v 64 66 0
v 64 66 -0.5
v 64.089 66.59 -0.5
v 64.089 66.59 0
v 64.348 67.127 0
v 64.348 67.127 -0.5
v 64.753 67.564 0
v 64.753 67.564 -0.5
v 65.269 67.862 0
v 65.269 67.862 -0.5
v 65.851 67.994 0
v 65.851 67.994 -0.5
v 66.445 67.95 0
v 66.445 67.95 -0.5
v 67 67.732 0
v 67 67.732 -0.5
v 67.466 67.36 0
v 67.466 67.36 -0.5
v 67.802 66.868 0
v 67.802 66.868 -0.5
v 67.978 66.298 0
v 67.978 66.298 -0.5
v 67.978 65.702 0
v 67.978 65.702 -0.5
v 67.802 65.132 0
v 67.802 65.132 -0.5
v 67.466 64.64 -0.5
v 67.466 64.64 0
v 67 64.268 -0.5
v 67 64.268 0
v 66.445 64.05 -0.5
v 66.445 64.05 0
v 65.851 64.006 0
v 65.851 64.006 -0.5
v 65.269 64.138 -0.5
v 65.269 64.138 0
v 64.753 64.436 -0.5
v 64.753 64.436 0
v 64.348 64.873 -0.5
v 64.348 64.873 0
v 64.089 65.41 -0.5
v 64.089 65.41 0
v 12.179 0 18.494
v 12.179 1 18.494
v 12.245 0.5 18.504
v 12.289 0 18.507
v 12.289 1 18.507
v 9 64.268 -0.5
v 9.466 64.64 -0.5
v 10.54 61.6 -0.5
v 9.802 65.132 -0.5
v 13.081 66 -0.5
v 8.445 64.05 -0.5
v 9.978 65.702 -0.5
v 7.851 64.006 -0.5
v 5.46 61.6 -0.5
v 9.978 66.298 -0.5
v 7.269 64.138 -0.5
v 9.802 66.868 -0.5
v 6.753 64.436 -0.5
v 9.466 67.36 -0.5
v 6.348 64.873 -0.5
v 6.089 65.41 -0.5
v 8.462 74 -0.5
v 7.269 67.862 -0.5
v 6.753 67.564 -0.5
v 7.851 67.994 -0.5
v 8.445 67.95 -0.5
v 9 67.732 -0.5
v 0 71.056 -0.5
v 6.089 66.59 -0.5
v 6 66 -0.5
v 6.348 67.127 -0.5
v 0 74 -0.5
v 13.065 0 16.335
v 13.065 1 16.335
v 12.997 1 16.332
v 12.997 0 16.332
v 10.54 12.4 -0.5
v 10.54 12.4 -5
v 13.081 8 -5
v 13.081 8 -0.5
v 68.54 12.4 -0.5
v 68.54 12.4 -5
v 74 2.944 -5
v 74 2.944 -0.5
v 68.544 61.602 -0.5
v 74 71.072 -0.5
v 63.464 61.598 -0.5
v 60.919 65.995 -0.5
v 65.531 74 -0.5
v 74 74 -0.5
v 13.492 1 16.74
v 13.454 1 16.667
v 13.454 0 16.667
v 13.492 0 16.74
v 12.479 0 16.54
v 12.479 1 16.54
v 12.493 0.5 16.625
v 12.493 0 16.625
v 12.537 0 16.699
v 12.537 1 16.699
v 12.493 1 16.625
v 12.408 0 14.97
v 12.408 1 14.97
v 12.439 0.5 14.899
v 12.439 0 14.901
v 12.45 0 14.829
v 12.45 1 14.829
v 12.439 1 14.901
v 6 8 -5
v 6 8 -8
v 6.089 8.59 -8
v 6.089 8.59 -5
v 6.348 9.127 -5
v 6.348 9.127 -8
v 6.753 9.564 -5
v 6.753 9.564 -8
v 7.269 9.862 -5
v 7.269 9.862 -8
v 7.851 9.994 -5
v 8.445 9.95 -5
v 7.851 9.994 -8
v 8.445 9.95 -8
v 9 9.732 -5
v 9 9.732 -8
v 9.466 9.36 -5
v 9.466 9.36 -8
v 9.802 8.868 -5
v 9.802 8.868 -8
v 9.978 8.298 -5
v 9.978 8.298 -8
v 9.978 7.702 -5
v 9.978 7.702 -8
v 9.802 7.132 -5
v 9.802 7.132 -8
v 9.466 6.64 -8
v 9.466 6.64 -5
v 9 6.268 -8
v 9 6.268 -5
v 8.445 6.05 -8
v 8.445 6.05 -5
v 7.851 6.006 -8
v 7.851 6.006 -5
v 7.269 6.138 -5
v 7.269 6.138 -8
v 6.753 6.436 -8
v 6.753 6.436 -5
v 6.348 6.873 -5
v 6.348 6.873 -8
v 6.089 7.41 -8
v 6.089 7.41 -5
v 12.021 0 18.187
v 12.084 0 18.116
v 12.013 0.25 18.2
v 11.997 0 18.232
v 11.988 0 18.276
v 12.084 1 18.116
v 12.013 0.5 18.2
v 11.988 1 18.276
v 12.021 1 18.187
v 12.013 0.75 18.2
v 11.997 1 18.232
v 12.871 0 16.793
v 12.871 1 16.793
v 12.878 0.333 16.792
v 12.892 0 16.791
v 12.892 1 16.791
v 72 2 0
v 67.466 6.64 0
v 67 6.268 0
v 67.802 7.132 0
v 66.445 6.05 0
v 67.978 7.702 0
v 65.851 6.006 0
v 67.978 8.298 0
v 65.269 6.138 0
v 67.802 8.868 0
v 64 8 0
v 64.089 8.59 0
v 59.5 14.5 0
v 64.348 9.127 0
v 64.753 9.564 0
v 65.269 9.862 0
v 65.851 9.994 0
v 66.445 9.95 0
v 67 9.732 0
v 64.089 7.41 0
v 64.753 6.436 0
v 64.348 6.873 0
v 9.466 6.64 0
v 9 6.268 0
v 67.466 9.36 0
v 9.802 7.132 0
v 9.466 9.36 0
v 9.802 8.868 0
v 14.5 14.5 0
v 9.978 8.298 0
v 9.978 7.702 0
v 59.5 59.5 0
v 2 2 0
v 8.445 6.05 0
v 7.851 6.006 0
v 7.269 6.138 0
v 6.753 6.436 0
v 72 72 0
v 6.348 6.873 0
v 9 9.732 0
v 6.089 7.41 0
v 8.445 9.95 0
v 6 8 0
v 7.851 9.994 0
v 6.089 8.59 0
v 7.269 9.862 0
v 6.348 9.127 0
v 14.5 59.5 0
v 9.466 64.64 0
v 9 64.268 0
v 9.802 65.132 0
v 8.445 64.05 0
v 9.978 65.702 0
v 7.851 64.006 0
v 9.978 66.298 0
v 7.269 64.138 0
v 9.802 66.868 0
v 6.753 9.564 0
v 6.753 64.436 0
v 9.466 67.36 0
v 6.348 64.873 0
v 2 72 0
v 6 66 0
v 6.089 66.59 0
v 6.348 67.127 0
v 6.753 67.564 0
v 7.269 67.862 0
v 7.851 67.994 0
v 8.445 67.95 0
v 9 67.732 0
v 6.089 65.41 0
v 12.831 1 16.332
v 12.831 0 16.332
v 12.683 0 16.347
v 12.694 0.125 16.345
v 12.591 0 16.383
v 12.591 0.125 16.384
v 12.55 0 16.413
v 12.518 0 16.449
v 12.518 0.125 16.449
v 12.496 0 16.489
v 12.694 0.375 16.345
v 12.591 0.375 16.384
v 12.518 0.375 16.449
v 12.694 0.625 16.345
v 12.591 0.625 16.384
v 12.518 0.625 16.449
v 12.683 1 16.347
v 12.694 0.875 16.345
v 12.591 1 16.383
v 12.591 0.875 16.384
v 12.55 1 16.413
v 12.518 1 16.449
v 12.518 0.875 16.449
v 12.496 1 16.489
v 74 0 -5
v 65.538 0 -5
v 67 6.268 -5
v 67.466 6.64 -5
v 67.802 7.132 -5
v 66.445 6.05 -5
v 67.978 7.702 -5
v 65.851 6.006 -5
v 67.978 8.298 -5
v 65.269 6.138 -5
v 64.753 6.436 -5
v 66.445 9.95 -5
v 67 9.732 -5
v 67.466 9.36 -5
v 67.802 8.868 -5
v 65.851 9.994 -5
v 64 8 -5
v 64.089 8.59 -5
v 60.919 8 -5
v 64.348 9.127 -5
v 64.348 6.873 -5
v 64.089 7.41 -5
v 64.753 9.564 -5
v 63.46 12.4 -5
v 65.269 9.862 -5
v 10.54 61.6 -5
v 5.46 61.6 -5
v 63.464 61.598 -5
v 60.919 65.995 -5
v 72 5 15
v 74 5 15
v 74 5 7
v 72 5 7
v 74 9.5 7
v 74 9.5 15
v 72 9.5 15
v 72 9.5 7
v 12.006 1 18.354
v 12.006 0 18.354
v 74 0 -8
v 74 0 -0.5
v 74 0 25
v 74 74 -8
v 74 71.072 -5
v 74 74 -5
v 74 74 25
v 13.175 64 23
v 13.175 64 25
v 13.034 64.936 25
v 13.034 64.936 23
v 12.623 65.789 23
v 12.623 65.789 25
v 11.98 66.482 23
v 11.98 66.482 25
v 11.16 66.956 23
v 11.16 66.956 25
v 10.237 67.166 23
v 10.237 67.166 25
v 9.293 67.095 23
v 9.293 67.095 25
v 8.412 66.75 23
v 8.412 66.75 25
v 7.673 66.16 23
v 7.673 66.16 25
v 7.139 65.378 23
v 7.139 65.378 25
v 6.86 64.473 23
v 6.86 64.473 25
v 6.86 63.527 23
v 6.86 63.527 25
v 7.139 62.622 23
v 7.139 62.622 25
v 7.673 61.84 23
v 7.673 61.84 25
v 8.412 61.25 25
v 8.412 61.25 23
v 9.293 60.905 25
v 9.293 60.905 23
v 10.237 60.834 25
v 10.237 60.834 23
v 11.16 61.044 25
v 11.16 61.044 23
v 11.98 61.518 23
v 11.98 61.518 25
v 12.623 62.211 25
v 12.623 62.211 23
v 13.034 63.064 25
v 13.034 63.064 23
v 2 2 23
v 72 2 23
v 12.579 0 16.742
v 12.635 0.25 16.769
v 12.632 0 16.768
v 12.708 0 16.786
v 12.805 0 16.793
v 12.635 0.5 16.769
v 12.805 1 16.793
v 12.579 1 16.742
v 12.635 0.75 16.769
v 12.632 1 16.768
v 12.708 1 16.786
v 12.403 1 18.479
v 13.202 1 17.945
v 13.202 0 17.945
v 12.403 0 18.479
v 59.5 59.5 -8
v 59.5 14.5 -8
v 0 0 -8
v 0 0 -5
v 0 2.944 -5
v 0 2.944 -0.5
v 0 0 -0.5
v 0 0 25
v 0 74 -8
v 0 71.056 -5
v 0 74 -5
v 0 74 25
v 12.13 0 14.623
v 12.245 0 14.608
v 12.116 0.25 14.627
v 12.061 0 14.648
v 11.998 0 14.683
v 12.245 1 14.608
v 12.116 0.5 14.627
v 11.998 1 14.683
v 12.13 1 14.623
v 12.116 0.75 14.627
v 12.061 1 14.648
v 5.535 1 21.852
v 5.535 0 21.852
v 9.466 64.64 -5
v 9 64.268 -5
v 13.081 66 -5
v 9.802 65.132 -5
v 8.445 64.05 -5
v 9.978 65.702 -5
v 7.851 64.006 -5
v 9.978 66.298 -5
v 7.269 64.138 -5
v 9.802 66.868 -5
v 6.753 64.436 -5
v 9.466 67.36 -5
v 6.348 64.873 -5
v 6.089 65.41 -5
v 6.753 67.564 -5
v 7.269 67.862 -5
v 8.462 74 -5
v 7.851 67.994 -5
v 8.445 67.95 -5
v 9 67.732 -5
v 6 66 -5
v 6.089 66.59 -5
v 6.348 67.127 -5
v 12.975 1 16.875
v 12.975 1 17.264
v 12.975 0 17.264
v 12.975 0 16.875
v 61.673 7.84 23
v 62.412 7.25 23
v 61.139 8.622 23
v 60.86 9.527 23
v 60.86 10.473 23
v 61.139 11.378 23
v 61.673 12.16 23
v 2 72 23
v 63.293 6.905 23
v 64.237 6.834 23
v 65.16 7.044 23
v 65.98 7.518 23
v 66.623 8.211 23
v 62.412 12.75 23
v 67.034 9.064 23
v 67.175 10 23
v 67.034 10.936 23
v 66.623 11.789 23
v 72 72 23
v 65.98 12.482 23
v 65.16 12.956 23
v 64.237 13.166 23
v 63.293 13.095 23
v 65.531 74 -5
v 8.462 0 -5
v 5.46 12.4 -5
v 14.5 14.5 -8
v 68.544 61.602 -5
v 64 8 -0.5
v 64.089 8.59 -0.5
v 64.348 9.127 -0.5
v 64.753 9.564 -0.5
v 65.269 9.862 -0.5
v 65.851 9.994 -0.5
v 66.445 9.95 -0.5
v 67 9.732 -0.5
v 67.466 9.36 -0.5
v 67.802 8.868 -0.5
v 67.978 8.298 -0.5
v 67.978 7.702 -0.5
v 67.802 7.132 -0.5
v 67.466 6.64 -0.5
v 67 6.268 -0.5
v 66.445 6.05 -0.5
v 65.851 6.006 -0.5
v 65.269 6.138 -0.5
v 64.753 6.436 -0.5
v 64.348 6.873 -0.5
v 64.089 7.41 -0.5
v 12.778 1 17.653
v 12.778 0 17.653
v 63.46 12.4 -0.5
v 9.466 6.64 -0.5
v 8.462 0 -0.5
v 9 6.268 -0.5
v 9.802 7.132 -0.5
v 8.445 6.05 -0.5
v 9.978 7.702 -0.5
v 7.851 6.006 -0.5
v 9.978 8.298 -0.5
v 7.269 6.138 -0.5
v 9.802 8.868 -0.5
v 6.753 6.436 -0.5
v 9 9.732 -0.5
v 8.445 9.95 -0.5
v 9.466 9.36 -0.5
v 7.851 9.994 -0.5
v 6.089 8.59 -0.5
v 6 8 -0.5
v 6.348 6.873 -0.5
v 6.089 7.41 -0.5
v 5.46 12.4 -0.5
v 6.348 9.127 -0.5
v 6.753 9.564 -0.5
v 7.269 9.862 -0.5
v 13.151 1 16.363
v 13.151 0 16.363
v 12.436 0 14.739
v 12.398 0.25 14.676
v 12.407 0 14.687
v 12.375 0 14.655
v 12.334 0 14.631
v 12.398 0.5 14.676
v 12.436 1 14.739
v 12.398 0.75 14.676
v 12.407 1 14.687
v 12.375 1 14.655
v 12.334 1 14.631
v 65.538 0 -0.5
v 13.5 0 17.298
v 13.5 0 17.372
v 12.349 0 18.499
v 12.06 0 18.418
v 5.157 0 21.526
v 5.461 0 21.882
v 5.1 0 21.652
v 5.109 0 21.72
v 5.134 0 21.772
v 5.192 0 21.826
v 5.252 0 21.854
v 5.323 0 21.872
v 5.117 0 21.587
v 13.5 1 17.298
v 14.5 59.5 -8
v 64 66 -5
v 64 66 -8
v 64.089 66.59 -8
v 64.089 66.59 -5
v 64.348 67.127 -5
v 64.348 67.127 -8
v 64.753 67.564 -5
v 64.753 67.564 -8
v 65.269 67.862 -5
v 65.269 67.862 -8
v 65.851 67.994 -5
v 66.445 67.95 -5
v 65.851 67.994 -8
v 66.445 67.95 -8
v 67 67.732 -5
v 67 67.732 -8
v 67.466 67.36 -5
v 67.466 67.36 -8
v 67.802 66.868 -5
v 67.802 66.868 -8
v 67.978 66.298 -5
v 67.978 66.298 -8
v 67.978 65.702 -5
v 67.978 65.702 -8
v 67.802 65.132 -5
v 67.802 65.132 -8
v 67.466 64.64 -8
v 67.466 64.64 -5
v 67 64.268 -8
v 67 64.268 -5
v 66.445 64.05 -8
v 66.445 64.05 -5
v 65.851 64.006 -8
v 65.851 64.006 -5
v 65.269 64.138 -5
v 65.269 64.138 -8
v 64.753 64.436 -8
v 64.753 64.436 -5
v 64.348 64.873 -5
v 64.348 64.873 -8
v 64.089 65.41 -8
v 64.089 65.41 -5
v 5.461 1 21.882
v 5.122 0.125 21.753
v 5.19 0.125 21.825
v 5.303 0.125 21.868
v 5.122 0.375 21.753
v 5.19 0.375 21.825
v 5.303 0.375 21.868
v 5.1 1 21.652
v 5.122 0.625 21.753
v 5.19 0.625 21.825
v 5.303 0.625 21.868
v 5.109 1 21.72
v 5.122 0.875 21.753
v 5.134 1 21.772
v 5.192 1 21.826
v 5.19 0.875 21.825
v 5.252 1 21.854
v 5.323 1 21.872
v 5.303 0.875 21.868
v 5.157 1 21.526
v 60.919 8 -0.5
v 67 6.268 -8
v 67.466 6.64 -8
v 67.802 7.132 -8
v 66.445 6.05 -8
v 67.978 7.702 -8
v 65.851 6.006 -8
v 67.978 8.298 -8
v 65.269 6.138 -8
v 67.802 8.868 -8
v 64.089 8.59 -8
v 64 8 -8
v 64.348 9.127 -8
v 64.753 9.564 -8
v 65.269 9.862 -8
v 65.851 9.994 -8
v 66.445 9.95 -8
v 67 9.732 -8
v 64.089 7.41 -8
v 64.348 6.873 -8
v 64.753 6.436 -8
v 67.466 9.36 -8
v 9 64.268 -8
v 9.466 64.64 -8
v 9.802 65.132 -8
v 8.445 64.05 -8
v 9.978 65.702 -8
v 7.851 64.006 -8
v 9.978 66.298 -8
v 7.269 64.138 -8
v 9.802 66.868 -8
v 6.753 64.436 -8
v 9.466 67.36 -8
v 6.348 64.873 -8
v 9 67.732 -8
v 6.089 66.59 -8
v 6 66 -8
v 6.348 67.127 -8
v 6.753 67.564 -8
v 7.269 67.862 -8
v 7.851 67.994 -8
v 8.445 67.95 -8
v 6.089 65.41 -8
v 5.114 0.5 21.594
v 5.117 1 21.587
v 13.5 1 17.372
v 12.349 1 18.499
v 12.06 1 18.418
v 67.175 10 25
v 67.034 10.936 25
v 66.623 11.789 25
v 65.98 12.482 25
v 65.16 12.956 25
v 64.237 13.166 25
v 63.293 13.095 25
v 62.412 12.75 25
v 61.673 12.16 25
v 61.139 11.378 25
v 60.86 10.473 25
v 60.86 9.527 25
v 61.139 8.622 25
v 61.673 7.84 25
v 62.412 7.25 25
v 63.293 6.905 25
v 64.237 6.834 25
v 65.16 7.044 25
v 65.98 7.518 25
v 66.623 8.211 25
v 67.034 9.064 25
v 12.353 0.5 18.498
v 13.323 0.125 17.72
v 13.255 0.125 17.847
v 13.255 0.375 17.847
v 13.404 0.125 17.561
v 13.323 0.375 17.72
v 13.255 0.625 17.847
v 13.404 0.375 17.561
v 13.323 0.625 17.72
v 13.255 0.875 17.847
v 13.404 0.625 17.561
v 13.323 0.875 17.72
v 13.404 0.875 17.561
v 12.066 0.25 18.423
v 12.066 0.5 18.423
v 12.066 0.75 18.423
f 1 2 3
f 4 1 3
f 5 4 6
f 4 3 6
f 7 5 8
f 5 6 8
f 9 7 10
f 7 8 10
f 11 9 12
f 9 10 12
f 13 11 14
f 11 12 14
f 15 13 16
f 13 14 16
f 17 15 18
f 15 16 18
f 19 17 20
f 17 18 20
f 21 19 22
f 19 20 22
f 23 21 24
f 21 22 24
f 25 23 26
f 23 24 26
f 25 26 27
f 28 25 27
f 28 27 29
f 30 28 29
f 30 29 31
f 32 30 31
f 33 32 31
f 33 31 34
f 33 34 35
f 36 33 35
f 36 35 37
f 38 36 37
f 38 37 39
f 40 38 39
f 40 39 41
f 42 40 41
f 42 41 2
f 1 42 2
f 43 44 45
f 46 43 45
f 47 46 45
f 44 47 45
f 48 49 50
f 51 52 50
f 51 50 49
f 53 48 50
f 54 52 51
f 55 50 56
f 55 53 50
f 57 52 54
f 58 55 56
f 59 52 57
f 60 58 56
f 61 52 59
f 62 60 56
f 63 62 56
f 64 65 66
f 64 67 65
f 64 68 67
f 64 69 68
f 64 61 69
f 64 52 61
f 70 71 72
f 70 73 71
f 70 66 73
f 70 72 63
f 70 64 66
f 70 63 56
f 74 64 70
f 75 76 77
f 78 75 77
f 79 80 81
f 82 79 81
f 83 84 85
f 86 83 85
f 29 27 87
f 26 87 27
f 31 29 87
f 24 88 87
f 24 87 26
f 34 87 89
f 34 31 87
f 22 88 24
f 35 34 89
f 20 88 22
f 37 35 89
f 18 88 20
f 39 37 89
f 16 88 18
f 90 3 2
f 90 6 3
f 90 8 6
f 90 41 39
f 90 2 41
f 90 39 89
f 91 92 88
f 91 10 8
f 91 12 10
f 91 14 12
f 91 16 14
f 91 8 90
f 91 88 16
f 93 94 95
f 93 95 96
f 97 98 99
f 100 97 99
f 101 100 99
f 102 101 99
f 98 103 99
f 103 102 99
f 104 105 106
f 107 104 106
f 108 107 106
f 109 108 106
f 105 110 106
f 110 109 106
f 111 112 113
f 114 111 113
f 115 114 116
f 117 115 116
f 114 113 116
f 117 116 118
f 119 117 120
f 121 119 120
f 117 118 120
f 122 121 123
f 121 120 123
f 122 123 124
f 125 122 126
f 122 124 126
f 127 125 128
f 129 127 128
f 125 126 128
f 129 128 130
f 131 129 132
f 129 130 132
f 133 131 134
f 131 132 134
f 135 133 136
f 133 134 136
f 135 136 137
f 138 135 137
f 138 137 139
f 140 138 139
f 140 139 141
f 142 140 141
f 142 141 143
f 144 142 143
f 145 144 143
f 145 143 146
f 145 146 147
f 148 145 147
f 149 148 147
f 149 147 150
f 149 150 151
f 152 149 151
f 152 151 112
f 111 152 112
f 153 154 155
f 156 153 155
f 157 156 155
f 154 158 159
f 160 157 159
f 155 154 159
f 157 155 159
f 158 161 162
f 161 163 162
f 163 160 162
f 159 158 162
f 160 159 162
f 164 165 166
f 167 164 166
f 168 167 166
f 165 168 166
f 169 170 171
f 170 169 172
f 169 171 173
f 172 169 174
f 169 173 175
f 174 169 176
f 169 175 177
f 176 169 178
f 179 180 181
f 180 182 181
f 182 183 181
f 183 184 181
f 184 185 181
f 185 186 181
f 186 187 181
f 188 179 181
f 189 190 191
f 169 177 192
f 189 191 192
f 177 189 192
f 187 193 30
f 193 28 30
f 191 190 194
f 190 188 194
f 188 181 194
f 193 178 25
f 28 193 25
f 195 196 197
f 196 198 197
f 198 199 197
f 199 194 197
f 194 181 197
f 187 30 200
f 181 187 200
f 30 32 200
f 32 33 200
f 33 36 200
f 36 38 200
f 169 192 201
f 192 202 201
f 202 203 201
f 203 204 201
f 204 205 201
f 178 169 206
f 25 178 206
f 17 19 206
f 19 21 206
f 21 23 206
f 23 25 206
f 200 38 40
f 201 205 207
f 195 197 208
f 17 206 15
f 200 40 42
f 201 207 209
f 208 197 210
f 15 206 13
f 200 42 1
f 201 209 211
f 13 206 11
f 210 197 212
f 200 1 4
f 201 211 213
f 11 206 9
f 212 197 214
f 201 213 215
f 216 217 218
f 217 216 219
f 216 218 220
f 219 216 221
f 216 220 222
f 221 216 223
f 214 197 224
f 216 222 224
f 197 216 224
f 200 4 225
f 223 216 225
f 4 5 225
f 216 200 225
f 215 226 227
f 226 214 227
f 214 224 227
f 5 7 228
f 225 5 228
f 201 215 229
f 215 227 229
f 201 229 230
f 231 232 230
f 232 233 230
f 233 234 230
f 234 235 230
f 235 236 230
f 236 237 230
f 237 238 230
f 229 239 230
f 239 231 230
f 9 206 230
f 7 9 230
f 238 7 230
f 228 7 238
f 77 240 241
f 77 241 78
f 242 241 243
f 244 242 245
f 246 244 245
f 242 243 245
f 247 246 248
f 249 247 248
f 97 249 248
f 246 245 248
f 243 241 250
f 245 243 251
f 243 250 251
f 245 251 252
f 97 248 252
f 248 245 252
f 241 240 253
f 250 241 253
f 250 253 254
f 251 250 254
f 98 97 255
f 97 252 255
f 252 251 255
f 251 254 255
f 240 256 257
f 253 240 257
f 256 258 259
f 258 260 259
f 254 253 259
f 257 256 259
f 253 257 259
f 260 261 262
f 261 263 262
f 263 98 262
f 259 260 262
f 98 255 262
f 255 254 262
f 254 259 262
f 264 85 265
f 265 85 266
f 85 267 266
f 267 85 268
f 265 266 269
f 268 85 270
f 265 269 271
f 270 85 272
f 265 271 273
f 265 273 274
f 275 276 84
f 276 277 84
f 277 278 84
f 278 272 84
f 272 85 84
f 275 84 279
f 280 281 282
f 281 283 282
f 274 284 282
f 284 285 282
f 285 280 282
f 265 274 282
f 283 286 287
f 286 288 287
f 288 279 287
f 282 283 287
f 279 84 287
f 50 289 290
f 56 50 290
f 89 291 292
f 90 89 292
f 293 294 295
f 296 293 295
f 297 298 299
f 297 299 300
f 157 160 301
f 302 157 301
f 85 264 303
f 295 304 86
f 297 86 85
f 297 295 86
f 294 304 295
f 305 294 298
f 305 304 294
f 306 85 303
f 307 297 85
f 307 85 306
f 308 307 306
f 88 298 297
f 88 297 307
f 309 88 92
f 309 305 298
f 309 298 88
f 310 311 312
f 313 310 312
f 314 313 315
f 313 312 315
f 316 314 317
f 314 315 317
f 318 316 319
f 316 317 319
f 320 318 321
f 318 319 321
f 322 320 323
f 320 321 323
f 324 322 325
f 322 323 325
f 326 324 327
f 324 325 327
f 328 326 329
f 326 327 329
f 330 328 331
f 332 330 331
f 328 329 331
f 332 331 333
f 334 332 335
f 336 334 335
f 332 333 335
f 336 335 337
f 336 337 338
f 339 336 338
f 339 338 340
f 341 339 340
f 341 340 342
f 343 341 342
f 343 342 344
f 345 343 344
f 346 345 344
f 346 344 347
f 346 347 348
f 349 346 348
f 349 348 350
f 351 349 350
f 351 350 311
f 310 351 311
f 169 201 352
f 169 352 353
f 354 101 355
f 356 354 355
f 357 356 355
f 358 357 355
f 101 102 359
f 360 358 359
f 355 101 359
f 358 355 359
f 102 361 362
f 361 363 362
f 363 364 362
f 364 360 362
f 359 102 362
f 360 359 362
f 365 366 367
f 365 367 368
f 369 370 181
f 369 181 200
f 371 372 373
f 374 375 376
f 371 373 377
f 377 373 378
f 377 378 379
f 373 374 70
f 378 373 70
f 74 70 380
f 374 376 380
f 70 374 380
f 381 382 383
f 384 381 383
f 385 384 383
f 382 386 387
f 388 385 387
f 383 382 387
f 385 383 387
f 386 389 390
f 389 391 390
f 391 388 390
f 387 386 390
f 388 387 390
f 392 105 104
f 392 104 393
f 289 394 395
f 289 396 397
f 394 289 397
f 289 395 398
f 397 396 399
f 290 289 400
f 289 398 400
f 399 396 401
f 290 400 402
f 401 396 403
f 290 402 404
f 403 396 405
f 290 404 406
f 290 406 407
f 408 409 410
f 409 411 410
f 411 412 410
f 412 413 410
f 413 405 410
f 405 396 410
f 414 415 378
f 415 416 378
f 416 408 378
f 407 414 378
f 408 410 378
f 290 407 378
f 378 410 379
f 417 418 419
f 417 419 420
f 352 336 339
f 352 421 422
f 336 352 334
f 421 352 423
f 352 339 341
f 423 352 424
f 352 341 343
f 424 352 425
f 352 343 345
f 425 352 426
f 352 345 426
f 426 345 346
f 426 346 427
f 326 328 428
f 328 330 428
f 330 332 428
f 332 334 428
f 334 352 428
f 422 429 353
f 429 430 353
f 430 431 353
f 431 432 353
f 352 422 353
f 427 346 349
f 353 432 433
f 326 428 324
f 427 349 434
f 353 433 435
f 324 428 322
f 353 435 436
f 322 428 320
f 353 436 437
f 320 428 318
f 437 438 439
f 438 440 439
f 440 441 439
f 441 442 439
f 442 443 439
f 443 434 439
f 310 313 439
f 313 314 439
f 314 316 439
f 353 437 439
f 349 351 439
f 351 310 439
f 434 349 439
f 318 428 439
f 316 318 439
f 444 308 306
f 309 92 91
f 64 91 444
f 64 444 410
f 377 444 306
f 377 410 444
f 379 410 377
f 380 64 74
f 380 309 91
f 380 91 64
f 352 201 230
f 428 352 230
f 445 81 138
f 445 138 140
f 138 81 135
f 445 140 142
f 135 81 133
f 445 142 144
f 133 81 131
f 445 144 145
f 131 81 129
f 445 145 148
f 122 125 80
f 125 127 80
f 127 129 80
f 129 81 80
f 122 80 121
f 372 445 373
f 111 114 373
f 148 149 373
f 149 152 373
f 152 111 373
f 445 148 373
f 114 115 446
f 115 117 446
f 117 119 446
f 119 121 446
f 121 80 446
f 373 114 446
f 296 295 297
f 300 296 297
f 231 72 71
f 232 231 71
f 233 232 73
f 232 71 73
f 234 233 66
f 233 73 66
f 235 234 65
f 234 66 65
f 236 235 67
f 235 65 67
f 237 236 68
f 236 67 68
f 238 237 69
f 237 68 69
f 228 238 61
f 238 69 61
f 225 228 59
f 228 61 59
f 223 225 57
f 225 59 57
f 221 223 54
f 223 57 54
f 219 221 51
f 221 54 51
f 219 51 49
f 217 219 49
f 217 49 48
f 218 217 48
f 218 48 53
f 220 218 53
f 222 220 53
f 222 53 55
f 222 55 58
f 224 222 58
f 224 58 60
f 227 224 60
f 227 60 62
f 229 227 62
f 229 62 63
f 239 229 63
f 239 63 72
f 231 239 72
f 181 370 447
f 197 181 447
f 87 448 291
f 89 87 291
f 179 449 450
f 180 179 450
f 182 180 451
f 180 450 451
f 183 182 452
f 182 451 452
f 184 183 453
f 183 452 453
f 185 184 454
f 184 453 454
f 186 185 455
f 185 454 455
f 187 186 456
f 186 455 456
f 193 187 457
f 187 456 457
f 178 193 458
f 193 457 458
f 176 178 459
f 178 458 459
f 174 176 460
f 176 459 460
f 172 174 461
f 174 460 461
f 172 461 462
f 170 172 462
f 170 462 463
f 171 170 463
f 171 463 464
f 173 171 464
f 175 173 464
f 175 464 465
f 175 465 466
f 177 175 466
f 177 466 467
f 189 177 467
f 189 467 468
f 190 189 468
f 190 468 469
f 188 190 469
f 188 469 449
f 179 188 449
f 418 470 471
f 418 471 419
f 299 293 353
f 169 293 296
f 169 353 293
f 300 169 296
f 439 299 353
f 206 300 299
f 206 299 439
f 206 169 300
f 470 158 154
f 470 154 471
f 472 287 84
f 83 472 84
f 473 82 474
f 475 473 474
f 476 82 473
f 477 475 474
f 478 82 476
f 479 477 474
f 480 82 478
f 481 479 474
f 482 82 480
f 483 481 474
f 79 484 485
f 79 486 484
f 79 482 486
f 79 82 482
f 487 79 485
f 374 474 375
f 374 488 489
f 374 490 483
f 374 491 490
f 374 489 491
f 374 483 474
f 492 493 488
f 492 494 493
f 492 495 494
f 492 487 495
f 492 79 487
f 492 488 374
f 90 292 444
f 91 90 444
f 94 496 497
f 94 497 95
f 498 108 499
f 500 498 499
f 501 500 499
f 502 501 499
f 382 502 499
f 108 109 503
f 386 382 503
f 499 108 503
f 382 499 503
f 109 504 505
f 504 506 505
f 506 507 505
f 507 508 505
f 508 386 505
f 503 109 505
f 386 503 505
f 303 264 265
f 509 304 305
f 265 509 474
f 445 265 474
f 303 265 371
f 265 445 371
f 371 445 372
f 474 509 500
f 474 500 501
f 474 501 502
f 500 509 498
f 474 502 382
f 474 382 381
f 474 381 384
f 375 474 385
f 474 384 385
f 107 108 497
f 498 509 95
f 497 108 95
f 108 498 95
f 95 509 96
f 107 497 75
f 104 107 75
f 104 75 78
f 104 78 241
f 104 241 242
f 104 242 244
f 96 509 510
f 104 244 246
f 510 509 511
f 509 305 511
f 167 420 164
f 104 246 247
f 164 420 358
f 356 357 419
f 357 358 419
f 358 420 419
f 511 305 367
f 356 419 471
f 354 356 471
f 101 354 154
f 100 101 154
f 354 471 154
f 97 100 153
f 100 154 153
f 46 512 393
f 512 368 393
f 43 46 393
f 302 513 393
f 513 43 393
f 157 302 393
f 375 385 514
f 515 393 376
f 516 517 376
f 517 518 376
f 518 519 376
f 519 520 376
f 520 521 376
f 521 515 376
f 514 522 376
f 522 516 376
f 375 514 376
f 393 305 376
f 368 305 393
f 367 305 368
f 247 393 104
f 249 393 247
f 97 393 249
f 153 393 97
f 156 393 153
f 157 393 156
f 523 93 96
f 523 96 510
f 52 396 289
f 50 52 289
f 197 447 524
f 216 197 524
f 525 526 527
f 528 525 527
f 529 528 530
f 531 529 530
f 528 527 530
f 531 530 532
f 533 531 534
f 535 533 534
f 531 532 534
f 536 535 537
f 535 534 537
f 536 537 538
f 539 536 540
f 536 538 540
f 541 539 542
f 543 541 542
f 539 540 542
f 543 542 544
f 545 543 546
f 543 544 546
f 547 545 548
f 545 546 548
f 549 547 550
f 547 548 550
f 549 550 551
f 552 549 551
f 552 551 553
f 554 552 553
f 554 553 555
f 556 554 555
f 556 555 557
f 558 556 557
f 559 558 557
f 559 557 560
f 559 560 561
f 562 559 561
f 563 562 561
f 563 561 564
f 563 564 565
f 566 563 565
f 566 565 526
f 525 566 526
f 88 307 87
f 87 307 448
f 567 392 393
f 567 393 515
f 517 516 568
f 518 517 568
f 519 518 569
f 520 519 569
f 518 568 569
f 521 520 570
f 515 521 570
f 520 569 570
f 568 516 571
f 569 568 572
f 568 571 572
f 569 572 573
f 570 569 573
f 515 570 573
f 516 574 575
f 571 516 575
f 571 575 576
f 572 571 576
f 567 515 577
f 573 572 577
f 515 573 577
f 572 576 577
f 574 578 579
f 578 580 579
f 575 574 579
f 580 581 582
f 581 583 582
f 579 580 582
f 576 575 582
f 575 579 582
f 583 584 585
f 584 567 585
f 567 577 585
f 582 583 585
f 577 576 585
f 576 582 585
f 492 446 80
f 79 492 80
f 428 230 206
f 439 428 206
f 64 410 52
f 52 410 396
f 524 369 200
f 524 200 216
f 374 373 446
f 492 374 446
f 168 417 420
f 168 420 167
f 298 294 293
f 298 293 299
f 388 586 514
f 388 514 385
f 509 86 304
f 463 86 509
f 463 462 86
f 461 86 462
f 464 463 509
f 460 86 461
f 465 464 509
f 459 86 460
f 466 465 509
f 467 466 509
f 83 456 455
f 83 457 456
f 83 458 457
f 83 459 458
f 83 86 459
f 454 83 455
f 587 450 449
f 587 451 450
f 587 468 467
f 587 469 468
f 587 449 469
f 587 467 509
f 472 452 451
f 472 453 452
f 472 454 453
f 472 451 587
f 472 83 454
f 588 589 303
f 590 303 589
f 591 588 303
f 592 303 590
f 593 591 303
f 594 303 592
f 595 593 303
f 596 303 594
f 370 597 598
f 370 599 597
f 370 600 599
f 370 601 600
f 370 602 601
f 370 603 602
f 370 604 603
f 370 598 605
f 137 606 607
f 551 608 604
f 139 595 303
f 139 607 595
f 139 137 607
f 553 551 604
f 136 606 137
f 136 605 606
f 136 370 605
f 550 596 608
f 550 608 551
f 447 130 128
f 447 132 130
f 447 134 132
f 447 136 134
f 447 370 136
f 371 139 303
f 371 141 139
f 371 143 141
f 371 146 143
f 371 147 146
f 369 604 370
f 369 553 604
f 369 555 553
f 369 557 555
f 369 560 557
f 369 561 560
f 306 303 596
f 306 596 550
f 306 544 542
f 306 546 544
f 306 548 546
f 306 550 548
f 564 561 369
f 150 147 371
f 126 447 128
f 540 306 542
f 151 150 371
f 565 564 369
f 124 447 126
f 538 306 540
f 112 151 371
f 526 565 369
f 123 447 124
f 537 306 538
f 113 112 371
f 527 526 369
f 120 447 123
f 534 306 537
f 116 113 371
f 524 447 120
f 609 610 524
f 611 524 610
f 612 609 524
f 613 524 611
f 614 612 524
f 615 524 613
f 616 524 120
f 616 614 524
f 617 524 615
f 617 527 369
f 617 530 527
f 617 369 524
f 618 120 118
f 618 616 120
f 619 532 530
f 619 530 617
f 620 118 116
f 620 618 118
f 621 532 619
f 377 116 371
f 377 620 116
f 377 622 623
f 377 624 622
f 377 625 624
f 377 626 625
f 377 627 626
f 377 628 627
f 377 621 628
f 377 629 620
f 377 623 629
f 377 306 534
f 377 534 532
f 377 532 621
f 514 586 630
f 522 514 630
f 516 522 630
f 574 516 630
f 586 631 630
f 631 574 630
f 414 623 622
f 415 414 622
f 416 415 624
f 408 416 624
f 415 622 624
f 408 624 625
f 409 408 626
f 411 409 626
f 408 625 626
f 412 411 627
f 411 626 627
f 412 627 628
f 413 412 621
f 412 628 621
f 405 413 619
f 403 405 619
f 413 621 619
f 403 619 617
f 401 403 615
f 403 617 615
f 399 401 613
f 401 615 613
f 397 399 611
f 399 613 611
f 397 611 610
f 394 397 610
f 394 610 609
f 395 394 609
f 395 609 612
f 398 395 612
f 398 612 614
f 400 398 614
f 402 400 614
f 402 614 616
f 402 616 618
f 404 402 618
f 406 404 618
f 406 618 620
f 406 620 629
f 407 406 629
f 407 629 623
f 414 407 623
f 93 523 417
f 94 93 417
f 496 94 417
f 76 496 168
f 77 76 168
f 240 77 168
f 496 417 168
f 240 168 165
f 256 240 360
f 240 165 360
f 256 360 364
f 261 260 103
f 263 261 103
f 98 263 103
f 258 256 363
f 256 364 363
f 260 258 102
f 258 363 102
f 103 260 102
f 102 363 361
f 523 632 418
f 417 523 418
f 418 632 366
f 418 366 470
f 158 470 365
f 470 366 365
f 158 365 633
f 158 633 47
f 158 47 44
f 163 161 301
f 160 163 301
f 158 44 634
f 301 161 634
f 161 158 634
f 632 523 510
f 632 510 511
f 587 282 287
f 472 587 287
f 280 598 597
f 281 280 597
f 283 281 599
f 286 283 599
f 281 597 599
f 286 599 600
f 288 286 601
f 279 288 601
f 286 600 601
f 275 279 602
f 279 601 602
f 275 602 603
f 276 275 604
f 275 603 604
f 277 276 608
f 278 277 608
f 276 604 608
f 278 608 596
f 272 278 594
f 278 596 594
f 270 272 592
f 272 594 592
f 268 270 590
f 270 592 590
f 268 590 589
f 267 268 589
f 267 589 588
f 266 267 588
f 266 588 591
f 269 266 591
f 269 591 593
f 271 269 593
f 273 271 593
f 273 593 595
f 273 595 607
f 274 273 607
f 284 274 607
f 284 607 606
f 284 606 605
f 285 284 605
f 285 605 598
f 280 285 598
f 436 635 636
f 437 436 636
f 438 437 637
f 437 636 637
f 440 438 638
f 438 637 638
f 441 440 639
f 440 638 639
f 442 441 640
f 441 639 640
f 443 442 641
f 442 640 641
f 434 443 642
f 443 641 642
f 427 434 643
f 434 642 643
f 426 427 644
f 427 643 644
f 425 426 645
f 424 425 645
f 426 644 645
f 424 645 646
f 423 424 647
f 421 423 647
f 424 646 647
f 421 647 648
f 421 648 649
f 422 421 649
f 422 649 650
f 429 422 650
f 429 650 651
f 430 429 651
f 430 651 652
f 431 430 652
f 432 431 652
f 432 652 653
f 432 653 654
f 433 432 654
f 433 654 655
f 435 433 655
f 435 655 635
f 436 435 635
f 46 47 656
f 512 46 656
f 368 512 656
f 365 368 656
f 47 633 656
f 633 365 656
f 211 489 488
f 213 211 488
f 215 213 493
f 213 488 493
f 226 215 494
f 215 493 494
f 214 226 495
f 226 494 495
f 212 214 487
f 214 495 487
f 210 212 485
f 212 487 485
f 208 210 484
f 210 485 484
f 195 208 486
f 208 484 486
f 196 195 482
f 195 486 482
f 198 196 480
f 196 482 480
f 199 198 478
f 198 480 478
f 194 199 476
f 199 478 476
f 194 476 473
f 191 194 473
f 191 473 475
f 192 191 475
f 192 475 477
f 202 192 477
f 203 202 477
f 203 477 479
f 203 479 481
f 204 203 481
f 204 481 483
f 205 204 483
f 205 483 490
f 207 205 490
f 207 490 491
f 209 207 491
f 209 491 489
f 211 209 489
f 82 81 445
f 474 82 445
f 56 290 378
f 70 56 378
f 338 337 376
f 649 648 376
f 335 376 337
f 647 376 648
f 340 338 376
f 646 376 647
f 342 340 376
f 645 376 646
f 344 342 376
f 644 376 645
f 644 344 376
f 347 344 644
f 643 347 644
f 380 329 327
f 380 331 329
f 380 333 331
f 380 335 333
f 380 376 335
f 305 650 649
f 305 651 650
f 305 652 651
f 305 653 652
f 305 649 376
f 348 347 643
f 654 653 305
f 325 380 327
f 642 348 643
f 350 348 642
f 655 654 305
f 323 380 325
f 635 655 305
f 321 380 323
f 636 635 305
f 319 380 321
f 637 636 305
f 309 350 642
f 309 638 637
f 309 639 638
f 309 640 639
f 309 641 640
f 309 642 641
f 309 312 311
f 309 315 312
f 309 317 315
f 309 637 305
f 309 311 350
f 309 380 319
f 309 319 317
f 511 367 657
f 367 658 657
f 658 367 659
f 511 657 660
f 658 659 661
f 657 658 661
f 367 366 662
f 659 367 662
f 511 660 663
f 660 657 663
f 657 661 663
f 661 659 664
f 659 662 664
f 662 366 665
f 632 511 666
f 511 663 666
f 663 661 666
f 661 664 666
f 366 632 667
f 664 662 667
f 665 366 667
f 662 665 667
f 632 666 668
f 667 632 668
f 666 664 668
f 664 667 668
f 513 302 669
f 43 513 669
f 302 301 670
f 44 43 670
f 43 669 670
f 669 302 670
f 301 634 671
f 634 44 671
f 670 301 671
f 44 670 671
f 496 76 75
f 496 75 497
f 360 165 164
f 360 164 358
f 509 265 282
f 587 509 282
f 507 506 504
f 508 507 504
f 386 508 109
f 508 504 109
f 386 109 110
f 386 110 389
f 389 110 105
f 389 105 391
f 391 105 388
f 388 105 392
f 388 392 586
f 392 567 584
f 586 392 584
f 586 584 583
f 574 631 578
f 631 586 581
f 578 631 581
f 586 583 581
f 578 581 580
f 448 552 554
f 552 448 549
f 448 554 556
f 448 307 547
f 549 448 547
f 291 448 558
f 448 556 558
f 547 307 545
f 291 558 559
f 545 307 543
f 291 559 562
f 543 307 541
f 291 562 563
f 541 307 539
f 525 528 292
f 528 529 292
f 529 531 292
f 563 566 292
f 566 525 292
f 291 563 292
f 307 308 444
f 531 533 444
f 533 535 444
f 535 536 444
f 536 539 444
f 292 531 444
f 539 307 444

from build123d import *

# Parameters (mm, degrees)
SKETCH1_W           = 74
SKETCH1_H           = 74
BOSS_EXTRUDE1_DEPTH = 25
SHELL1_T            = -2
SKETCH2_W           = 8
SKETCH2_H           = 4.5
CUT_EXTRUDE1_DEPTH  = 22
SKETCH3_R           = 3.175
CUT_EXTRUDE2_DEPTH  = 108.596468344
SKETCH4_W           = 74
SKETCH4_H           = 74
BOSS_EXTRUDE2_DEPTH = 8
CUT_EXTRUDE3_START  = -3
CUT_EXTRUDE3_DEPTH  = 4.5
SKETCH6_W           = 45
SKETCH6_H           = 45
CUT_EXTRUDE4_DEPTH  = 8
CUT_EXTRUDE10_START = -1
CUT_EXTRUDE10_DEPTH = 1
SKETCH5_4_R         = 2
CUT_EXTRUDE11_DEPTH = 9


# Read off the part's stored shape, not the designer's step: Cut-Extrude10
with BuildPart() as part:
    # Sketch1 → Boss-Extrude1 (new body)
    with BuildSketch(Plane.XY):
        with Locations((37, 37)):
            Rectangle(SKETCH1_W, SKETCH1_H)
    extrude(amount=BOSS_EXTRUDE1_DEPTH)

    # Shell1
    shell1_openings = [part.faces().sort_by_distance(p)[0] for p in [
        (37, 37, 0),
    ]]
    offset(amount=SHELL1_T, openings=shell1_openings, kind=Kind.INTERSECTION)

    # Sketch2 → Cut-Extrude1 (cut)
    with BuildSketch(Plane(origin=(74, 0, 0), x_dir=(0, 0, -1), z_dir=(1, 0, 0))):
        with Locations((-11, 7.25)):
            Rectangle(SKETCH2_W, SKETCH2_H)
    extrude(amount=-CUT_EXTRUDE1_DEPTH, mode=Mode.SUBTRACT)

    # Sketch3 → Cut-Extrude2 (cut, through all)
    with BuildSketch(Plane.XY.offset(25)):
        with Locations((10, 64)):
            Circle(SKETCH3_R)
        with Locations((64, 10)):
            Circle(SKETCH3_R)
    extrude(amount=-CUT_EXTRUDE2_DEPTH, mode=Mode.SUBTRACT)

    # Sketch4 → Boss-Extrude2 (add)
    with BuildSketch(Plane(origin=(0, 0, 0), x_dir=(-1, 0, 0), z_dir=(0, 0, -1))):
        with Locations((-37, 37)):
            Rectangle(SKETCH4_W, SKETCH4_H)
    extrude(amount=BOSS_EXTRUDE2_DEPTH)

    # Sketch5 → Cut-Extrude3 (cut)
    with BuildSketch(Plane(origin=(0, 0, -8), x_dir=(-1, 0, 0), z_dir=(0, 0, -1)).offset(CUT_EXTRUDE3_START)):
        Polygon((-60.919317631, 8), (-63.459658816, 12.4), (-68.540341184, 12.4), (-74.568746864, 1.958495074), (-74.568746864, -0.972282173), (-66.099467159, -0.972282173), align=None)
        Polygon((-63.463624712, 61.59771267), (-60.919319694, 65.995421768), (-65.802792889, 74.471475085), (-74.465371111, 74.471475085), (-74.465371111, 71.879253606), (-68.544305018, 61.602290902), align=None)
        Polygon((-5.459702524, 61.599974765), (0.703595557, 72.274875291), (0.703595557, 74.471475085), (-8.189590882, 74.471475085), (-13.080682369, 66.00005047), (-10.540384893, 61.600025235), align=None)
        Polygon((-10.540490231, 12.399913945), (-13.080682366, 7.999827894), (-7.995582963, -0.807133653), (0.571776258, -0.807133653), (0.571776258, 1.953893119), (-5.459807865, 12.40008605), align=None)
    extrude(amount=-CUT_EXTRUDE3_DEPTH, mode=Mode.SUBTRACT)

    # Sketch6 → Cut-Extrude4 (cut)
    with BuildSketch(Plane(origin=(0, 0, -8), x_dir=(-1, 0, 0), z_dir=(0, 0, -1))):
        with Locations((-37, 37)):
            Rectangle(SKETCH6_W, SKETCH6_H)
    extrude(amount=-CUT_EXTRUDE4_DEPTH, mode=Mode.SUBTRACT)

    # Cut-Extrude10 outline → Cut-Extrude10 (cut)
    with BuildSketch(Plane.XZ.offset(CUT_EXTRUDE10_START)):
        with BuildLine():
            add(Edge.make_bspline(
                [(12.244921875, 14.608337696), (12.22296299, 14.60920838), (12.179368061, 14.610936947), (12.115469745, 14.625798621), (12.053855992, 14.648733433), (12.016469754, 14.671753524), (11.99765625, 14.683337696)],
                knots=[0, 0, 0, 0, 0.251074868, 0.498458438, 0.747614234, 1, 1, 1, 1], degree=3))
            add(Edge.make_bspline(
                [(12.45, 14.828650196), (12.44810186, 14.799147003), (12.444554554, 14.744010497), (12.402329284, 14.672042766), (12.332334145, 14.623910287), (12.275809653, 14.613840387), (12.244921875, 14.608337696)],
                knots=[0, 0, 0, 0, 0.262135661, 0.489887456, 0.721249278, 1, 1, 1, 1], degree=3))
            add(Edge.make_bspline(
                [(12.4078125, 14.970447071), (12.420108898, 14.947127329), (12.443588874, 14.902598273), (12.447931564, 14.852508226), (12.45, 14.828650196)],
                knots=[0, 0, 0, 0, 0.523697188, 1, 1, 1, 1], degree=3))
            Line((12.4078125, 14.970447071), (5.534765625, 21.851697071))
            Line((5.534765625, 21.851697071), (5.4609375, 21.882165821))
            add(Edge.make_bspline(
                [(5.1, 21.652478321), (5.101130742, 21.670561394), (5.103297124, 21.705206632), (5.119685049, 21.75396019), (5.149823147, 21.794252088), (5.190287736, 21.827525127), (5.242920358, 21.851708451), (5.305475941, 21.870670729), (5.379789996, 21.880316446), (5.432791747, 21.881524371), (5.4609375, 21.882165821)],
                knots=[0, 0, 0, 0, 0.112194147, 0.214952003, 0.313891338, 0.420689243, 0.536721732, 0.670960238, 0.825268571, 1, 1, 1, 1], degree=3))
            add(Edge.make_bspline(
                [(5.157421875, 21.525915821), (5.140627717, 21.547577619), (5.111281334, 21.585429794), (5.103379727, 21.632391539), (5.1, 21.652478321)],
                knots=[0, 0, 0, 0, 0.572273528, 1, 1, 1, 1], degree=3))
            Line((5.157421875, 21.525915821), (11.99765625, 14.683337696))
        make_face()
        with BuildLine():
            add(Edge.make_bspline(
                [(12.830859375, 16.332165821), (12.806611722, 16.332880637), (12.760653103, 16.334235487), (12.695606656, 16.343185504), (12.639038997, 16.359243561), (12.590419576, 16.382273546), (12.548696495, 16.410908541), (12.516703569, 16.448495353), (12.492316543, 16.491450489), (12.483699168, 16.523311237), (12.479296875, 16.539587696)],
                knots=[0, 0, 0, 0, 0.163241443, 0.30940526, 0.440897743, 0.557355848, 0.670469959, 0.778582052, 0.886885889, 1, 1, 1, 1], degree=3))
            Line((12.830859375, 16.332165821), (12.997265625, 16.332165821))
            add(Edge.make_bspline(
                [(13.065234375, 16.334509571), (13.054297092, 16.334112667), (13.031642253, 16.333290544), (13.008984624, 16.332549239), (12.997265625, 16.332165821)],
                knots=[0, 0, 0, 0, 0.482779122, 1, 1, 1, 1], degree=3))
            Line((13.065234375, 16.334509571), (13.15078125, 16.362634571))
            Line((13.15078125, 16.362634571), (13.454296875, 16.667322071))
            Line((13.454296875, 16.667322071), (13.491796875, 16.739978321))
            Line((13.491796875, 16.739978321), (13.5, 17.297790821))
            Line((13.5, 17.297790821), (13.5, 17.371618946))
            add(Edge.make_bspline(
                [(13.20234375, 17.944665821), (13.210597157, 17.929849426), (13.228545564, 17.897628712), (13.256314404, 17.845089826), (13.288074333, 17.78479063), (13.324465456, 17.717657372), (13.363157298, 17.642066218), (13.405143778, 17.558563248), (13.452185232, 17.468028061), (13.483699781, 17.404485145), (13.5, 17.371618946)],
                knots=[0, 0, 0, 0, 0.078785549, 0.171332276, 0.276048266, 0.395387691, 0.526054495, 0.670509549, 0.829578188, 1, 1, 1, 1], degree=3))
            Line((13.20234375, 17.944665821), (12.403125, 18.479040821))
            add(Edge.make_bspline(
                [(12.289453125, 18.507165821), (12.31084801, 18.5052121), (12.350224476, 18.501616352), (12.386540839, 18.486118184), (12.403125, 18.479040821)],
                knots=[0, 0, 0, 0, 0.543341929, 1, 1, 1, 1], degree=3))
            add(Edge.make_bspline(
                [(12.179296875, 18.494275196), (12.201126009, 18.497814185), (12.237664521, 18.503737892), (12.274588549, 18.506181923), (12.289453125, 18.507165821)],
                knots=[0, 0, 0, 0, 0.597428096, 1, 1, 1, 1], degree=3))
            add(Edge.make_bspline(
                [(12.005859375, 18.353650196), (12.012754805, 18.365403015), (12.028374155, 18.392025197), (12.067688375, 18.425310284), (12.117788217, 18.461646386), (12.157466096, 18.482694512), (12.179296875, 18.494275196)],
                knots=[0, 0, 0, 0, 0.179374527, 0.406314537, 0.673354122, 1, 1, 1, 1], degree=3))
            add(Edge.make_bspline(
                [(11.98828125, 18.276306446), (11.990007203, 18.287684739), (11.993981075, 18.31388238), (12.001567772, 18.339282172), (12.005859375, 18.353650196)],
                knots=[0, 0, 0, 0, 0.434325116, 1, 1, 1, 1], degree=3))
            add(Edge.make_bspline(
                [(12.084375, 18.115759571), (12.069768434, 18.129757216), (12.042992013, 18.155417378), (12.013246552, 18.197681646), (11.992279819, 18.236971695), (11.9895321, 18.264001579), (11.98828125, 18.276306446)],
                knots=[0, 0, 0, 0, 0.315523821, 0.578411003, 0.808079218, 1, 1, 1, 1], degree=3))
            Line((12.084375, 18.115759571), (12.778125, 17.652868946))
            Line((12.778125, 17.652868946), (12.975, 17.263806446))
            Line((12.975, 17.263806446), (12.975, 16.874743946))
            Line((12.975, 16.874743946), (12.891522636, 16.791266582))
            add(Edge.make_bspline(
                [(12.870703125, 16.792712696), (12.87764234, 16.792220225), (12.884581555, 16.791727755), (12.891522636, 16.791266582)],
                knots=[0, 0, 0, 0, 0.362748525, 0.362748525, 0.362748525, 0.362748525], degree=3))
            Line((12.870703125, 16.792712696), (12.805078125, 16.792712696))
            add(Edge.make_bspline(
                [(12.53671875, 16.698962696), (12.549147315, 16.713703314), (12.575814448, 16.745331261), (12.638752816, 16.772945663), (12.716162101, 16.790262491), (12.773683775, 16.791847581), (12.805078125, 16.792712696)],
                knots=[0, 0, 0, 0, 0.193970343, 0.416189066, 0.681365937, 1, 1, 1, 1], degree=3))
            add(Edge.make_bspline(
                [(12.479296875, 16.539587696), (12.481482036, 16.569008186), (12.48582524, 16.627484051), (12.51982501, 16.675235867), (12.53671875, 16.698962696)],
                knots=[0, 0, 0, 0, 0.503121942, 1, 1, 1, 1], degree=3))
        make_face()
    extrude(amount=CUT_EXTRUDE10_DEPTH, mode=Mode.SUBTRACT)

    # Sketch5<4> → Cut-Extrude11 (cut)
    with BuildSketch(Plane(origin=(0, 0, -8), x_dir=(-1, 0, 0), z_dir=(0, 0, -1))):
        with Locations((-66, 66)):
            Circle(SKETCH5_4_R)
        with Locations((-8, 66)):
            Circle(SKETCH5_4_R)
        with Locations((-8, 8)):
            Circle(SKETCH5_4_R)
        with Locations((-66, 8)):
            Circle(SKETCH5_4_R)
    extrude(amount=-CUT_EXTRUDE11_DEPTH, mode=Mode.SUBTRACT)


solid = part.part
